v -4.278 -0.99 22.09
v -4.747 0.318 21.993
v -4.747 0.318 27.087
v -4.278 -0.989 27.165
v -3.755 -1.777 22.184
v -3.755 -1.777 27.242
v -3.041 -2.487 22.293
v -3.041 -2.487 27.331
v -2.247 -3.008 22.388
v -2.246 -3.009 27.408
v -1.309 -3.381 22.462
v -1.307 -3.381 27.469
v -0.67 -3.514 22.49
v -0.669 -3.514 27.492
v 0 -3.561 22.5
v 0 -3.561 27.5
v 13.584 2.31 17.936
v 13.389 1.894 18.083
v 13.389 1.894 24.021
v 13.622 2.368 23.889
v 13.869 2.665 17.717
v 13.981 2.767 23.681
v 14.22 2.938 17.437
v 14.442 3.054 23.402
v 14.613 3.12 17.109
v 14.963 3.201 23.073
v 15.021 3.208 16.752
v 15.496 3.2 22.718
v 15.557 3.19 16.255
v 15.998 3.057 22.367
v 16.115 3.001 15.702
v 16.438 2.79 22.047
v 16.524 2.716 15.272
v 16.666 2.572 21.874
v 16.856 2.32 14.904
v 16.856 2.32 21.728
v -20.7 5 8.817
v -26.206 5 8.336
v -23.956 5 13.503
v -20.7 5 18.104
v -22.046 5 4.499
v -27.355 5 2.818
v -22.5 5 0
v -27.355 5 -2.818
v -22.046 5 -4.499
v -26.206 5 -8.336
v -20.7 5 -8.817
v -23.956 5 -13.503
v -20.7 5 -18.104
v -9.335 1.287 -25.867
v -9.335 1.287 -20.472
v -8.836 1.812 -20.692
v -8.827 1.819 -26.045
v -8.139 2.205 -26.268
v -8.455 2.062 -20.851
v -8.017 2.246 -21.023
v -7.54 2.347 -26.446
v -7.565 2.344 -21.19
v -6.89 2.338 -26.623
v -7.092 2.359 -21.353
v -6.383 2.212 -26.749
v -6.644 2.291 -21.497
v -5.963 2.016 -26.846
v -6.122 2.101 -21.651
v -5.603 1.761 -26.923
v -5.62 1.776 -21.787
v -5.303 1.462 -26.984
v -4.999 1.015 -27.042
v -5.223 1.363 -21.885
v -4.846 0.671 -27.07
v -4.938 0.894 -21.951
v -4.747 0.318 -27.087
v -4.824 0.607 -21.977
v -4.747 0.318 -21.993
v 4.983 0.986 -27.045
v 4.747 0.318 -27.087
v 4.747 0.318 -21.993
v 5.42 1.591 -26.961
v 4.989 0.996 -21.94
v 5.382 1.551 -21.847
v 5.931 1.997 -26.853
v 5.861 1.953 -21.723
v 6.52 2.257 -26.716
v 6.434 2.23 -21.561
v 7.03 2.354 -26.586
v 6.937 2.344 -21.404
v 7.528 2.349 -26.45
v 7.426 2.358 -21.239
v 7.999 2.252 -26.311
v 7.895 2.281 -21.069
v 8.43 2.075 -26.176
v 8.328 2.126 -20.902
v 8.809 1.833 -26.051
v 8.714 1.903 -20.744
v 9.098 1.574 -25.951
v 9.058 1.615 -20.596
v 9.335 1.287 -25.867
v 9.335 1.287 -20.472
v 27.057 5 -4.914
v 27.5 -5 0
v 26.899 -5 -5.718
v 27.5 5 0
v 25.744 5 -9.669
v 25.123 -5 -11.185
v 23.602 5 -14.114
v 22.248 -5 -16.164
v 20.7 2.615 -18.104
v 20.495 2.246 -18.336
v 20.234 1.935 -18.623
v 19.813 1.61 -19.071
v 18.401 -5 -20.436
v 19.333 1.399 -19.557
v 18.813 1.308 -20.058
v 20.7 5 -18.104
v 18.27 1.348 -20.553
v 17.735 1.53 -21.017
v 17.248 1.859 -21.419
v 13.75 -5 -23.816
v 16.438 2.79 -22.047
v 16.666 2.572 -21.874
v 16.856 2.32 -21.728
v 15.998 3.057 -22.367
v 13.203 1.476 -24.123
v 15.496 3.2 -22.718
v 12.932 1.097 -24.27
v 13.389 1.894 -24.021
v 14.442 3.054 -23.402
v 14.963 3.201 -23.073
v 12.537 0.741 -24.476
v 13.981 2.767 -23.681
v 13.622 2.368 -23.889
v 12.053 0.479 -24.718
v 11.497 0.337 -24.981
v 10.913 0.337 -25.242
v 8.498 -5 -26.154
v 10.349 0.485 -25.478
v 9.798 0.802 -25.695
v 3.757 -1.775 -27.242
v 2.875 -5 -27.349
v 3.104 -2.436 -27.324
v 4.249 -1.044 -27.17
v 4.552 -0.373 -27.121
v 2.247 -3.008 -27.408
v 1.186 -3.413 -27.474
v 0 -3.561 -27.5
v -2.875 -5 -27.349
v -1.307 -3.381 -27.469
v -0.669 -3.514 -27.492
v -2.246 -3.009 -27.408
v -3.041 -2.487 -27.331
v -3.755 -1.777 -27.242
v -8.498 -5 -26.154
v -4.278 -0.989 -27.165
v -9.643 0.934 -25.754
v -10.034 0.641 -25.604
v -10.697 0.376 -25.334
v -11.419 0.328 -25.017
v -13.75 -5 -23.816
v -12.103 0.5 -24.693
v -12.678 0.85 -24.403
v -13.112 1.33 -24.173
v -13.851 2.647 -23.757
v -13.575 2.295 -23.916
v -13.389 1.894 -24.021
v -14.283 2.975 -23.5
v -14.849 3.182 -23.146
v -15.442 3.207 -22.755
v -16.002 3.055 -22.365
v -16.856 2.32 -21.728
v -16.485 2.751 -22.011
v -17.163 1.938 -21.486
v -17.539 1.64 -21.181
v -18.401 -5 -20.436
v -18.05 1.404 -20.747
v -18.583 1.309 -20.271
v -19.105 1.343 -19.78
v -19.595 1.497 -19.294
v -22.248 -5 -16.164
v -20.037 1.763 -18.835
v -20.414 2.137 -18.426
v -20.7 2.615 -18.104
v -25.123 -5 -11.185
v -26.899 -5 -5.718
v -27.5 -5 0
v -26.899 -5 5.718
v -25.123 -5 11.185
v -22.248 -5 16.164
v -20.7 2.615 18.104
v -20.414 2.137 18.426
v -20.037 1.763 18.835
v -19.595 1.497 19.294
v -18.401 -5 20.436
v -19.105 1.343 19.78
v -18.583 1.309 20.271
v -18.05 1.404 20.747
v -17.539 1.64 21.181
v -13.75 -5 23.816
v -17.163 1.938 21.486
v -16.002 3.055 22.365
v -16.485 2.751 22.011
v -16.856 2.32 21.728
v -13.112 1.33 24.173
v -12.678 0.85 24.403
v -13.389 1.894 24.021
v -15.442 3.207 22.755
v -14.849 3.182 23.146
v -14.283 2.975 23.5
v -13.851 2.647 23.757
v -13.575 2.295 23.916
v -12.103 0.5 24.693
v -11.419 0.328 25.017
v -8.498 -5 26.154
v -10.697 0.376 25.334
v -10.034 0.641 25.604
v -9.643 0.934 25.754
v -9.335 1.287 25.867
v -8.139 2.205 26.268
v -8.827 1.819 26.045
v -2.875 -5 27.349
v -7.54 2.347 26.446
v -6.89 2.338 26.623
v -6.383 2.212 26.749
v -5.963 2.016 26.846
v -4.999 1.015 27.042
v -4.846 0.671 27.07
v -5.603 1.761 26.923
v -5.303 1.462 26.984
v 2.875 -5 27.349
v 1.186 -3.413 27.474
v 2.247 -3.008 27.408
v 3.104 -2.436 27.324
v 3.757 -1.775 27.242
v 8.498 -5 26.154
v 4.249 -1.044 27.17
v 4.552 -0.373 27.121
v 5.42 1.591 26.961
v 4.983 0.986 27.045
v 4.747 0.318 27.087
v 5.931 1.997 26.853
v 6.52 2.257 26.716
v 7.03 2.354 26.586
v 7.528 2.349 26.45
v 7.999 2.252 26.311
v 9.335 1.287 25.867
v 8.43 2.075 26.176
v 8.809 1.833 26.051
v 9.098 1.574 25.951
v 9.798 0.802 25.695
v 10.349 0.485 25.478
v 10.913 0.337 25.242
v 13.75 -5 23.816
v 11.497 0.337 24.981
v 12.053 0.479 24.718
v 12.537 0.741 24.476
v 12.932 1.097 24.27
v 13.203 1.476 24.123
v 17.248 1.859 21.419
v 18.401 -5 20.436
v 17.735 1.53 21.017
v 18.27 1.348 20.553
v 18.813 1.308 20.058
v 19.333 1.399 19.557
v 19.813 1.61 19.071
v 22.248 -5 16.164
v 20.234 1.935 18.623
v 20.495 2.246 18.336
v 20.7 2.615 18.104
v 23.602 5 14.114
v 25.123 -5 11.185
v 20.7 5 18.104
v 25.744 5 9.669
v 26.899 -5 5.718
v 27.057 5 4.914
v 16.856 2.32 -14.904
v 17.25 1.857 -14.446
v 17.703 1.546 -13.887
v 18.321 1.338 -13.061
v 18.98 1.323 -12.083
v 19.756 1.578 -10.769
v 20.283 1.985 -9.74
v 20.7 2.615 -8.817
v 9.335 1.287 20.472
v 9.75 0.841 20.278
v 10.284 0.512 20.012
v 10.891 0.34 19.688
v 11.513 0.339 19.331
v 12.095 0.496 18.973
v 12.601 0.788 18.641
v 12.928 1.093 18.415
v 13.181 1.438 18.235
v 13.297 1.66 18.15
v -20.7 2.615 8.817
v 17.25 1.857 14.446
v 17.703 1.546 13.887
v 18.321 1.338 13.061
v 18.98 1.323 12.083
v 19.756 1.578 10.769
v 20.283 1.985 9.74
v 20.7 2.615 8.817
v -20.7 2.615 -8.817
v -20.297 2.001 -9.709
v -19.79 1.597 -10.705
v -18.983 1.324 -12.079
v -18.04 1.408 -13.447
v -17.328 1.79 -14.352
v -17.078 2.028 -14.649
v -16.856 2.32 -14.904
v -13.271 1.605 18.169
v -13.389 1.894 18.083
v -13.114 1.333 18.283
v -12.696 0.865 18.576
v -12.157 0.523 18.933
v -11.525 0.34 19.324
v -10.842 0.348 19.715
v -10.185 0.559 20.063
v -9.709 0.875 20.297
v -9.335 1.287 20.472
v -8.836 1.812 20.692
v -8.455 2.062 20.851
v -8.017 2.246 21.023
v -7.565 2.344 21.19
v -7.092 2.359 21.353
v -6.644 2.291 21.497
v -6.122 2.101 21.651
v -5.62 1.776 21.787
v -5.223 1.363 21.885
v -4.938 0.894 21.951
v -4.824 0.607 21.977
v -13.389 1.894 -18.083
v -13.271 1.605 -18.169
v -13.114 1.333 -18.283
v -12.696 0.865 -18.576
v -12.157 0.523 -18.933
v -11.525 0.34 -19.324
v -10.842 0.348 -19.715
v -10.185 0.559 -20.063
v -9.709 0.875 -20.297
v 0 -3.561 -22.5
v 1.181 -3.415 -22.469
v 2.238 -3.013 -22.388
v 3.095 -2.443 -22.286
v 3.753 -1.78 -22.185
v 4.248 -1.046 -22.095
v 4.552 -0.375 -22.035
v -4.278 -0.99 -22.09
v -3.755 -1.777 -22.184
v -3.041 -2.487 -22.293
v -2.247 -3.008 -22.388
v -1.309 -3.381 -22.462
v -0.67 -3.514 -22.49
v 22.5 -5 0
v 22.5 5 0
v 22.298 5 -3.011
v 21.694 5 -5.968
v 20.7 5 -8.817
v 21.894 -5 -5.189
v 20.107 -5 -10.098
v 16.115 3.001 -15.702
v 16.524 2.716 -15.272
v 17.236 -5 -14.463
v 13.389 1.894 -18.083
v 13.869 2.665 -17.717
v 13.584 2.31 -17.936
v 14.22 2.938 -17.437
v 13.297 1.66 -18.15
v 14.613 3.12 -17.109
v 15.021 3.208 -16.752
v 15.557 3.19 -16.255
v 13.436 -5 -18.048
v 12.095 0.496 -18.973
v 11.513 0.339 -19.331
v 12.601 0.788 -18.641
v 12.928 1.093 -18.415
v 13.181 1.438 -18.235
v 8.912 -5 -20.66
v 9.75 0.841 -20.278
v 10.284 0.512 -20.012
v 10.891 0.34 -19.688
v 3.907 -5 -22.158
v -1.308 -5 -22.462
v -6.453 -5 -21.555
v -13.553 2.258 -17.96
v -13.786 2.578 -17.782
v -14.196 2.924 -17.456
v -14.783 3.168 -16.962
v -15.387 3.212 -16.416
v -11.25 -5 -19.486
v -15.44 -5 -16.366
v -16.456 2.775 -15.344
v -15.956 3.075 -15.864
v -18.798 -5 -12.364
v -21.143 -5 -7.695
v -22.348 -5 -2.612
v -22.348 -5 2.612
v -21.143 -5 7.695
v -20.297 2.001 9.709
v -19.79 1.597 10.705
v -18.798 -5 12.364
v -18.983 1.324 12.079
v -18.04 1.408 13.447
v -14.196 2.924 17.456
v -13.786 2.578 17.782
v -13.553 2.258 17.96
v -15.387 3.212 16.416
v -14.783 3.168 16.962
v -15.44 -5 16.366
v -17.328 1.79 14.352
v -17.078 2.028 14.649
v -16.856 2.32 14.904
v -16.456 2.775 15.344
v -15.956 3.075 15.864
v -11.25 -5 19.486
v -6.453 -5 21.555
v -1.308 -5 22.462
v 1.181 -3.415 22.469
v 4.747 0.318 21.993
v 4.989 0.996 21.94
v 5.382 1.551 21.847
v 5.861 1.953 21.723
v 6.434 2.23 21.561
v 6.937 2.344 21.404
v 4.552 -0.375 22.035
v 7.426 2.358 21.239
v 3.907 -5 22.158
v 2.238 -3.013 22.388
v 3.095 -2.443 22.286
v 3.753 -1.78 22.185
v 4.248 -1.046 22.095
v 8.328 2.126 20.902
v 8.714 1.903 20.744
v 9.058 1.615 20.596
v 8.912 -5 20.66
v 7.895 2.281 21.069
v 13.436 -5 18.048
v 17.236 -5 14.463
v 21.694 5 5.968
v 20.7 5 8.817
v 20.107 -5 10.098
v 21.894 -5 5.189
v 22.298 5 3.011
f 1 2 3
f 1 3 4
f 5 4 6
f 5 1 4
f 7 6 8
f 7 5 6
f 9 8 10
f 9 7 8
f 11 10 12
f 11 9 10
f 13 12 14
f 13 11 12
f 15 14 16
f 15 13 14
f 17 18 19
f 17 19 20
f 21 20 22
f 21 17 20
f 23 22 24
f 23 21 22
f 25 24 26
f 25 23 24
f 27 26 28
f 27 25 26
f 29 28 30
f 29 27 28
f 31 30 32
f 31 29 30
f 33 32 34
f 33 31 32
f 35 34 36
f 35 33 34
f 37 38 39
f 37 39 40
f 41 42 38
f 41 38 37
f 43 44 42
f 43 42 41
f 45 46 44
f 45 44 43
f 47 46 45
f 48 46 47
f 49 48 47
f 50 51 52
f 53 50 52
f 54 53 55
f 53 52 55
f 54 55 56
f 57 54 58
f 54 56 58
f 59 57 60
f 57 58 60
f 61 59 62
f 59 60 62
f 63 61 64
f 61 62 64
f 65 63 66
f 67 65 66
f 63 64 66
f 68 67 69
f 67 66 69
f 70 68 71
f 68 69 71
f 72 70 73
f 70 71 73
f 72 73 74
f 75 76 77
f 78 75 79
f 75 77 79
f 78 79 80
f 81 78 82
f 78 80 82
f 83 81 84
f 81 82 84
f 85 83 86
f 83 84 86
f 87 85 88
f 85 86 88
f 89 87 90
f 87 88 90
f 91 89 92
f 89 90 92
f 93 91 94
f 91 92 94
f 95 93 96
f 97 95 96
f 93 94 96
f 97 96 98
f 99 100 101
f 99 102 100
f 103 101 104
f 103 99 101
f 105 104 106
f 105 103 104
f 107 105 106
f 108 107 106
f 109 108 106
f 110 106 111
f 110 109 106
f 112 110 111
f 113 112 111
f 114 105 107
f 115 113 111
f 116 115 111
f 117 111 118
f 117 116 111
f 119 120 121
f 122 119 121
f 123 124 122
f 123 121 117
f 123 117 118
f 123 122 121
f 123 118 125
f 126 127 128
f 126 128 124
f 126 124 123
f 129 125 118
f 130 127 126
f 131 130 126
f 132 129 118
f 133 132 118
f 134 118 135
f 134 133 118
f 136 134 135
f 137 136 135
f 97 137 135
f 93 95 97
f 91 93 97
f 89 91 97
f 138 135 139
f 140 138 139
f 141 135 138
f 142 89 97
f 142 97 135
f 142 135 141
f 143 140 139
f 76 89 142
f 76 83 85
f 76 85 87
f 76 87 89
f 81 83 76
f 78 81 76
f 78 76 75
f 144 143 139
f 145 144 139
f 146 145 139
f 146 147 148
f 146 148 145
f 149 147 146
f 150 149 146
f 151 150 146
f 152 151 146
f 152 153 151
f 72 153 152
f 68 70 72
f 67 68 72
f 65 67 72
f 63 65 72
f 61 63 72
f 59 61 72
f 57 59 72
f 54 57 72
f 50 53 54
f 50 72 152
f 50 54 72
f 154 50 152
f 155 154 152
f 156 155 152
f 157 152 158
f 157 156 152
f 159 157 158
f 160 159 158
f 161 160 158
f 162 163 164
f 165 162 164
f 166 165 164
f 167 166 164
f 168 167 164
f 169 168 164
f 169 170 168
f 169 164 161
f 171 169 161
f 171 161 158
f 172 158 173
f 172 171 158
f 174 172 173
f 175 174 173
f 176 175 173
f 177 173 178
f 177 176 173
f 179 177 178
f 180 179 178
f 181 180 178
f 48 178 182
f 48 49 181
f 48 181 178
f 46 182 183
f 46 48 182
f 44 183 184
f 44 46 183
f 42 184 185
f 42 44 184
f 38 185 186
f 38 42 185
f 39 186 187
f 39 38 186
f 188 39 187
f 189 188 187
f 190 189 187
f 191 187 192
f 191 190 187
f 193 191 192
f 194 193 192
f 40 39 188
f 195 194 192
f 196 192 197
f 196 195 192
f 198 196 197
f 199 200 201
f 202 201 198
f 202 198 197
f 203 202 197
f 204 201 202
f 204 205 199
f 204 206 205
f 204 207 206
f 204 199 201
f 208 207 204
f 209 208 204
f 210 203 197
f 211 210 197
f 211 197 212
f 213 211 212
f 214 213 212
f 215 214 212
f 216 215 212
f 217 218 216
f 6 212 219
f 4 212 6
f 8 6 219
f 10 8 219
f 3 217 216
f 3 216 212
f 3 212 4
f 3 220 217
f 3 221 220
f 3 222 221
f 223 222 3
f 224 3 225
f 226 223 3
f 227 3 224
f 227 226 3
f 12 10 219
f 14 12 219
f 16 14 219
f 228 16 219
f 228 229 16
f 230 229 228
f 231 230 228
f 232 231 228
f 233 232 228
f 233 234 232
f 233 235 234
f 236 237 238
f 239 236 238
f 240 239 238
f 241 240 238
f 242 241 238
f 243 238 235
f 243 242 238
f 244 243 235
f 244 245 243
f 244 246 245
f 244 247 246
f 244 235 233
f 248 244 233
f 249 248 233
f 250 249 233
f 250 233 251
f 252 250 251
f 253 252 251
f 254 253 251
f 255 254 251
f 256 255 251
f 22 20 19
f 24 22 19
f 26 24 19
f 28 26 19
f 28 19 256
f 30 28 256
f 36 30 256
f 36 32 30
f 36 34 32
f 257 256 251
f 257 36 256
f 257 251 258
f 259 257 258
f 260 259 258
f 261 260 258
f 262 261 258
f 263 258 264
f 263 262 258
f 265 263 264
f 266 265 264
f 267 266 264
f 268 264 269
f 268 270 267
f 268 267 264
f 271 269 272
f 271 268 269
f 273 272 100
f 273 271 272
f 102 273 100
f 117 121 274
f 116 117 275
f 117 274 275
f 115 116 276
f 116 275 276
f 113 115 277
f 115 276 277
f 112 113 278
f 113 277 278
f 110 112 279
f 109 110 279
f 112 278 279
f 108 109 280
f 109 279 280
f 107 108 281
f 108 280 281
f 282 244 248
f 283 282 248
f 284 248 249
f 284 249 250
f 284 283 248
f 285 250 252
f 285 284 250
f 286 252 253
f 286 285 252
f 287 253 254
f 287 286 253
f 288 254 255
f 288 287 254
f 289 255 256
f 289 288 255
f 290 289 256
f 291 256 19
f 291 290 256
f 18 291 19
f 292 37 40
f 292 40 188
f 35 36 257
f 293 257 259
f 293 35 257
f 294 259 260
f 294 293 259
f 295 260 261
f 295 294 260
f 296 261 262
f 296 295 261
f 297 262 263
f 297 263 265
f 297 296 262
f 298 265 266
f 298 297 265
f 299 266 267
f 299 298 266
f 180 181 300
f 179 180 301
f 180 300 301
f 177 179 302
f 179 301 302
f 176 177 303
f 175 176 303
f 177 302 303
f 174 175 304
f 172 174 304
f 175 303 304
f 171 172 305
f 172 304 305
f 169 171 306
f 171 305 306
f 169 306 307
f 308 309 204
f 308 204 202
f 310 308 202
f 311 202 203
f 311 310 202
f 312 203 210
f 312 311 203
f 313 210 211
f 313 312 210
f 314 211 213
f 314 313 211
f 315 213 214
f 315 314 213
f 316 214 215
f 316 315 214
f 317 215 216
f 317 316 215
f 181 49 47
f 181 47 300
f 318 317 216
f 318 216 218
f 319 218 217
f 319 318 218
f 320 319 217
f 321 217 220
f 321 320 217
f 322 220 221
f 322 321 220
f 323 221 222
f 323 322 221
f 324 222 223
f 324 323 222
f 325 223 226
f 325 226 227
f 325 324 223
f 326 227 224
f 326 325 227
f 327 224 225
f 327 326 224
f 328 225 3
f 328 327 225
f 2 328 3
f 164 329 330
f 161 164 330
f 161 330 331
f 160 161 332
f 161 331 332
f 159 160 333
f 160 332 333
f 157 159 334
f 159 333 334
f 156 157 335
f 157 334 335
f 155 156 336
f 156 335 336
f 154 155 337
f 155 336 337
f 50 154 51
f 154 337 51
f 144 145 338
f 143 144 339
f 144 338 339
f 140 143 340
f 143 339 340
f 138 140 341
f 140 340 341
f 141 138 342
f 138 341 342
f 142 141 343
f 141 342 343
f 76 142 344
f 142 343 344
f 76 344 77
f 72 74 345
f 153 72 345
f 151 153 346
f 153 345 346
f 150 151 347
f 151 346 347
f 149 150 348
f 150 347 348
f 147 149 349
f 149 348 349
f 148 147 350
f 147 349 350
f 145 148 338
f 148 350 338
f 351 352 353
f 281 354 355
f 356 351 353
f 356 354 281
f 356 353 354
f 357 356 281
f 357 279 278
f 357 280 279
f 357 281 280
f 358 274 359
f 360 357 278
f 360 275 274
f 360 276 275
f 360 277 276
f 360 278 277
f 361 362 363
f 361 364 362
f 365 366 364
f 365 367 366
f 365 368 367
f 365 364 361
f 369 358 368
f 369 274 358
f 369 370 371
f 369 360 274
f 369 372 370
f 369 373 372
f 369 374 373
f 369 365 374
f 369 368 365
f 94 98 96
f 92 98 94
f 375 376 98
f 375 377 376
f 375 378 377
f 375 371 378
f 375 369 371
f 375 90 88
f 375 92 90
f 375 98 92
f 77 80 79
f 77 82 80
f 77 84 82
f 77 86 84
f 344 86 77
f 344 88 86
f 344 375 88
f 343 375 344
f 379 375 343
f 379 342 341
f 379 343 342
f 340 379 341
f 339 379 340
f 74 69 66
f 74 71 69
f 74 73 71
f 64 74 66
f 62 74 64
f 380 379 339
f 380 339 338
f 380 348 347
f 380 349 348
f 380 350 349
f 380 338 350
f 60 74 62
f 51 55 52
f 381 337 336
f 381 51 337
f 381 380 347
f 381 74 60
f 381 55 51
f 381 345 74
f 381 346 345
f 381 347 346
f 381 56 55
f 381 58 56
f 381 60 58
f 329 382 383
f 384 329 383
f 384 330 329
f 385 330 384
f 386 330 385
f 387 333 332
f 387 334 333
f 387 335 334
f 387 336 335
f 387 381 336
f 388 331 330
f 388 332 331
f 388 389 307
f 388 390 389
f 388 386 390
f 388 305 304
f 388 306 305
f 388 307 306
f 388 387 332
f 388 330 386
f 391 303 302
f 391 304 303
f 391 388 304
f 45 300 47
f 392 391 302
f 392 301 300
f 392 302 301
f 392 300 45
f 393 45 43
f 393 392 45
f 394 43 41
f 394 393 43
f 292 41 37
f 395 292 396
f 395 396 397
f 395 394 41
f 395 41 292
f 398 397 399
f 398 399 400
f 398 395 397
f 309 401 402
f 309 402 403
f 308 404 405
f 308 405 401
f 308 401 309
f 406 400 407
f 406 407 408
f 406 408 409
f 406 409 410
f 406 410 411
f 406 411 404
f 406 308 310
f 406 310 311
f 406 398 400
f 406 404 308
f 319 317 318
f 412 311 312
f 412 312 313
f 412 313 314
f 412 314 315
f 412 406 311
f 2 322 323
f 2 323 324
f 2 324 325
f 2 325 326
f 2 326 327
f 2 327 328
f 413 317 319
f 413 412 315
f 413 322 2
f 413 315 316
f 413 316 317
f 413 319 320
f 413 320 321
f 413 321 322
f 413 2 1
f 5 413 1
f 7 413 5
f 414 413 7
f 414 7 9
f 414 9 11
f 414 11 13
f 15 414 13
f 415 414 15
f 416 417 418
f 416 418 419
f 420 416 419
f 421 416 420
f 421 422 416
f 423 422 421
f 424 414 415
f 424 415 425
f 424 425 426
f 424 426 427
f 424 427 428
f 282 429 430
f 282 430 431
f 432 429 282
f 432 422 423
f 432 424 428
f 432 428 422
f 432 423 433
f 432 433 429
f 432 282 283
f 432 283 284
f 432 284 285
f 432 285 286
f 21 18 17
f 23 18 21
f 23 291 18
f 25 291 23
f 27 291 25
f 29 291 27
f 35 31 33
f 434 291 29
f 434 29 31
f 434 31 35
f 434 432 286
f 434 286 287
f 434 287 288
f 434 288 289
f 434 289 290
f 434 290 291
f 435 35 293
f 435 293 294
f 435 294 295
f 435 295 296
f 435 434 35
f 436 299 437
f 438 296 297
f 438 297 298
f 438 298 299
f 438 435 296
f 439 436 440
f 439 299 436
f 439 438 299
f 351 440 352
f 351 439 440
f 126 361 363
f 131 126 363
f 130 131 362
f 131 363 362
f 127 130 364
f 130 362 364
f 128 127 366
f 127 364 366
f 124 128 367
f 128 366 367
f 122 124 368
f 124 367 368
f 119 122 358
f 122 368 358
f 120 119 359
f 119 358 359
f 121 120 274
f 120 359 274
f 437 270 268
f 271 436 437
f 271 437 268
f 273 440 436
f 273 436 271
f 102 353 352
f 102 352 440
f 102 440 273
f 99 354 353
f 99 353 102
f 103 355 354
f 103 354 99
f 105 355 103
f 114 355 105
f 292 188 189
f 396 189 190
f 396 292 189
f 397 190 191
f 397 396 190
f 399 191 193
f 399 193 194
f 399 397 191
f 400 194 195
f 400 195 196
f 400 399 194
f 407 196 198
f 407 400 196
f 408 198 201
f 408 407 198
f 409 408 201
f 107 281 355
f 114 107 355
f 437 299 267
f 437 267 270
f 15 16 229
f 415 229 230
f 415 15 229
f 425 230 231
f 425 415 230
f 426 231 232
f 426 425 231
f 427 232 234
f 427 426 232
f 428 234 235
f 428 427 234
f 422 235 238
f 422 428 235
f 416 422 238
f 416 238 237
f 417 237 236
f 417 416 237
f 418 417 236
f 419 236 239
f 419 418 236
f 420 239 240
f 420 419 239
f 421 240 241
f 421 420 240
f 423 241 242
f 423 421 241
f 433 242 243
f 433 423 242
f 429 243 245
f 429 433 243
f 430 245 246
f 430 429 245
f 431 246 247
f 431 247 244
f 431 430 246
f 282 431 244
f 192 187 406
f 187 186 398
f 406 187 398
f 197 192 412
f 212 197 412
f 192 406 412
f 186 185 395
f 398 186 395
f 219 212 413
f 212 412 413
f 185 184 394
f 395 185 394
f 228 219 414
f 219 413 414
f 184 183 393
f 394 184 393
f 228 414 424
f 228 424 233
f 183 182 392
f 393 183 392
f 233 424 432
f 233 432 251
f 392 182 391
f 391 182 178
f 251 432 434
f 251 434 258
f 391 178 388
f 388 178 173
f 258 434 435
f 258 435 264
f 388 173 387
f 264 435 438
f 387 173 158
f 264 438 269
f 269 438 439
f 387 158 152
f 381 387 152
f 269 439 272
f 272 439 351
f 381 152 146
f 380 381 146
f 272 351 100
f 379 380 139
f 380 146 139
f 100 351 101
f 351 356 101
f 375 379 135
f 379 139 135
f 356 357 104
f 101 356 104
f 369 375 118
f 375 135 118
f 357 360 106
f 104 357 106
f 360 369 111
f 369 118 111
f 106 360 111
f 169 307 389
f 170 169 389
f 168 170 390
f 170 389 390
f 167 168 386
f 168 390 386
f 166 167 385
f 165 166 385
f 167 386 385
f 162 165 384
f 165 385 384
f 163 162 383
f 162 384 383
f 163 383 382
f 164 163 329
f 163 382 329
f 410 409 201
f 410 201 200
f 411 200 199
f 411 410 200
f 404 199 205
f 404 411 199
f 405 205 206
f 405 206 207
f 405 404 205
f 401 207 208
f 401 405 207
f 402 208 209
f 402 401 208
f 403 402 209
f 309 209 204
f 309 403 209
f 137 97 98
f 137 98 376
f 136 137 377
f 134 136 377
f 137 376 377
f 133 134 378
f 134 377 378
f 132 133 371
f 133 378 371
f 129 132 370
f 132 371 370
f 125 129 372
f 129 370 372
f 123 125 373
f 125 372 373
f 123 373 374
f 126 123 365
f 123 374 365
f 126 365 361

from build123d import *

# Parameters (mm, degrees)
SKETCH1_R               = 27.5
SKETCH1_R_2             = 22.5
BOSS_EXTRUDE1_DEPTH     = 5
CUT_EXTRUDE3_DEPTH      = 28.5
CUT_EXTRUDE3_DEPTH_BACK = 28.5


with BuildPart() as part:
    # Sketch1 → Boss-Extrude1 (new body, symmetric)
    with BuildSketch(Plane(origin=(0, 0, 0), x_dir=(1, 0, 0), z_dir=(0, 1, 0))):
        Circle(SKETCH1_R)
        Circle(SKETCH1_R_2, mode=Mode.SUBTRACT)
    extrude(amount=BOSS_EXTRUDE1_DEPTH, both=True)

    # Sketch3 → Cut-Extrude3 (cut, two sides)
    with BuildSketch(Plane.XY) as cut_extrude3_sk:
        with BuildLine():
            ThreePointArc((-4.74745791, 0.318346798), (-3.065358978, -2.467655845), (0, -3.56074408))
            Line((0, -3.56074408), (0, 5))
            Line((0, 5), (-20.700497525, 5))
            Line((-20.700497525, 5), (-20.700497525, 2.615010963))
            ThreePointArc((-20.700497525, 2.615010963), (-18.866910307, 1.311744504), (-16.85614269, 2.320386731))
            ThreePointArc((-16.85614269, 2.320386731), (-14.987432042, 3.204610911), (-13.38889815, 1.893648941))
            ThreePointArc((-13.38889815, 1.893648941), (-11.548514755, 0.343661099), (-9.334889148, 1.286706711))
            ThreePointArc((-9.334889148, 1.286706711), (-6.723222767, 2.308761406), (-4.74745791, 0.318346798))
        make_face()
        with BuildLine():
            Line((0, 5), (0, -3.56074408))
            ThreePointArc((0, -3.56074408), (3.065358978, -2.467655845), (4.74745791, 0.318346798))
            ThreePointArc((4.74745791, 0.318346798), (6.723222767, 2.308761406), (9.334889148, 1.286706711))
            ThreePointArc((9.334889148, 1.286706711), (11.548514755, 0.343661099), (13.38889815, 1.893648941))
            ThreePointArc((13.38889815, 1.893648941), (14.987432042, 3.204610911), (16.85614269, 2.320386731))
            ThreePointArc((16.85614269, 2.320386731), (18.866910307, 1.311744504), (20.700497525, 2.615010963))
            Line((20.700497525, 2.615010963), (20.700497525, 5))
            Line((20.700497525, 5), (0, 5))
        make_face()
    extrude(amount=CUT_EXTRUDE3_DEPTH, mode=Mode.SUBTRACT)
    extrude(cut_extrude3_sk.sketch, amount=-CUT_EXTRUDE3_DEPTH_BACK, mode=Mode.SUBTRACT)


solid = part.part
